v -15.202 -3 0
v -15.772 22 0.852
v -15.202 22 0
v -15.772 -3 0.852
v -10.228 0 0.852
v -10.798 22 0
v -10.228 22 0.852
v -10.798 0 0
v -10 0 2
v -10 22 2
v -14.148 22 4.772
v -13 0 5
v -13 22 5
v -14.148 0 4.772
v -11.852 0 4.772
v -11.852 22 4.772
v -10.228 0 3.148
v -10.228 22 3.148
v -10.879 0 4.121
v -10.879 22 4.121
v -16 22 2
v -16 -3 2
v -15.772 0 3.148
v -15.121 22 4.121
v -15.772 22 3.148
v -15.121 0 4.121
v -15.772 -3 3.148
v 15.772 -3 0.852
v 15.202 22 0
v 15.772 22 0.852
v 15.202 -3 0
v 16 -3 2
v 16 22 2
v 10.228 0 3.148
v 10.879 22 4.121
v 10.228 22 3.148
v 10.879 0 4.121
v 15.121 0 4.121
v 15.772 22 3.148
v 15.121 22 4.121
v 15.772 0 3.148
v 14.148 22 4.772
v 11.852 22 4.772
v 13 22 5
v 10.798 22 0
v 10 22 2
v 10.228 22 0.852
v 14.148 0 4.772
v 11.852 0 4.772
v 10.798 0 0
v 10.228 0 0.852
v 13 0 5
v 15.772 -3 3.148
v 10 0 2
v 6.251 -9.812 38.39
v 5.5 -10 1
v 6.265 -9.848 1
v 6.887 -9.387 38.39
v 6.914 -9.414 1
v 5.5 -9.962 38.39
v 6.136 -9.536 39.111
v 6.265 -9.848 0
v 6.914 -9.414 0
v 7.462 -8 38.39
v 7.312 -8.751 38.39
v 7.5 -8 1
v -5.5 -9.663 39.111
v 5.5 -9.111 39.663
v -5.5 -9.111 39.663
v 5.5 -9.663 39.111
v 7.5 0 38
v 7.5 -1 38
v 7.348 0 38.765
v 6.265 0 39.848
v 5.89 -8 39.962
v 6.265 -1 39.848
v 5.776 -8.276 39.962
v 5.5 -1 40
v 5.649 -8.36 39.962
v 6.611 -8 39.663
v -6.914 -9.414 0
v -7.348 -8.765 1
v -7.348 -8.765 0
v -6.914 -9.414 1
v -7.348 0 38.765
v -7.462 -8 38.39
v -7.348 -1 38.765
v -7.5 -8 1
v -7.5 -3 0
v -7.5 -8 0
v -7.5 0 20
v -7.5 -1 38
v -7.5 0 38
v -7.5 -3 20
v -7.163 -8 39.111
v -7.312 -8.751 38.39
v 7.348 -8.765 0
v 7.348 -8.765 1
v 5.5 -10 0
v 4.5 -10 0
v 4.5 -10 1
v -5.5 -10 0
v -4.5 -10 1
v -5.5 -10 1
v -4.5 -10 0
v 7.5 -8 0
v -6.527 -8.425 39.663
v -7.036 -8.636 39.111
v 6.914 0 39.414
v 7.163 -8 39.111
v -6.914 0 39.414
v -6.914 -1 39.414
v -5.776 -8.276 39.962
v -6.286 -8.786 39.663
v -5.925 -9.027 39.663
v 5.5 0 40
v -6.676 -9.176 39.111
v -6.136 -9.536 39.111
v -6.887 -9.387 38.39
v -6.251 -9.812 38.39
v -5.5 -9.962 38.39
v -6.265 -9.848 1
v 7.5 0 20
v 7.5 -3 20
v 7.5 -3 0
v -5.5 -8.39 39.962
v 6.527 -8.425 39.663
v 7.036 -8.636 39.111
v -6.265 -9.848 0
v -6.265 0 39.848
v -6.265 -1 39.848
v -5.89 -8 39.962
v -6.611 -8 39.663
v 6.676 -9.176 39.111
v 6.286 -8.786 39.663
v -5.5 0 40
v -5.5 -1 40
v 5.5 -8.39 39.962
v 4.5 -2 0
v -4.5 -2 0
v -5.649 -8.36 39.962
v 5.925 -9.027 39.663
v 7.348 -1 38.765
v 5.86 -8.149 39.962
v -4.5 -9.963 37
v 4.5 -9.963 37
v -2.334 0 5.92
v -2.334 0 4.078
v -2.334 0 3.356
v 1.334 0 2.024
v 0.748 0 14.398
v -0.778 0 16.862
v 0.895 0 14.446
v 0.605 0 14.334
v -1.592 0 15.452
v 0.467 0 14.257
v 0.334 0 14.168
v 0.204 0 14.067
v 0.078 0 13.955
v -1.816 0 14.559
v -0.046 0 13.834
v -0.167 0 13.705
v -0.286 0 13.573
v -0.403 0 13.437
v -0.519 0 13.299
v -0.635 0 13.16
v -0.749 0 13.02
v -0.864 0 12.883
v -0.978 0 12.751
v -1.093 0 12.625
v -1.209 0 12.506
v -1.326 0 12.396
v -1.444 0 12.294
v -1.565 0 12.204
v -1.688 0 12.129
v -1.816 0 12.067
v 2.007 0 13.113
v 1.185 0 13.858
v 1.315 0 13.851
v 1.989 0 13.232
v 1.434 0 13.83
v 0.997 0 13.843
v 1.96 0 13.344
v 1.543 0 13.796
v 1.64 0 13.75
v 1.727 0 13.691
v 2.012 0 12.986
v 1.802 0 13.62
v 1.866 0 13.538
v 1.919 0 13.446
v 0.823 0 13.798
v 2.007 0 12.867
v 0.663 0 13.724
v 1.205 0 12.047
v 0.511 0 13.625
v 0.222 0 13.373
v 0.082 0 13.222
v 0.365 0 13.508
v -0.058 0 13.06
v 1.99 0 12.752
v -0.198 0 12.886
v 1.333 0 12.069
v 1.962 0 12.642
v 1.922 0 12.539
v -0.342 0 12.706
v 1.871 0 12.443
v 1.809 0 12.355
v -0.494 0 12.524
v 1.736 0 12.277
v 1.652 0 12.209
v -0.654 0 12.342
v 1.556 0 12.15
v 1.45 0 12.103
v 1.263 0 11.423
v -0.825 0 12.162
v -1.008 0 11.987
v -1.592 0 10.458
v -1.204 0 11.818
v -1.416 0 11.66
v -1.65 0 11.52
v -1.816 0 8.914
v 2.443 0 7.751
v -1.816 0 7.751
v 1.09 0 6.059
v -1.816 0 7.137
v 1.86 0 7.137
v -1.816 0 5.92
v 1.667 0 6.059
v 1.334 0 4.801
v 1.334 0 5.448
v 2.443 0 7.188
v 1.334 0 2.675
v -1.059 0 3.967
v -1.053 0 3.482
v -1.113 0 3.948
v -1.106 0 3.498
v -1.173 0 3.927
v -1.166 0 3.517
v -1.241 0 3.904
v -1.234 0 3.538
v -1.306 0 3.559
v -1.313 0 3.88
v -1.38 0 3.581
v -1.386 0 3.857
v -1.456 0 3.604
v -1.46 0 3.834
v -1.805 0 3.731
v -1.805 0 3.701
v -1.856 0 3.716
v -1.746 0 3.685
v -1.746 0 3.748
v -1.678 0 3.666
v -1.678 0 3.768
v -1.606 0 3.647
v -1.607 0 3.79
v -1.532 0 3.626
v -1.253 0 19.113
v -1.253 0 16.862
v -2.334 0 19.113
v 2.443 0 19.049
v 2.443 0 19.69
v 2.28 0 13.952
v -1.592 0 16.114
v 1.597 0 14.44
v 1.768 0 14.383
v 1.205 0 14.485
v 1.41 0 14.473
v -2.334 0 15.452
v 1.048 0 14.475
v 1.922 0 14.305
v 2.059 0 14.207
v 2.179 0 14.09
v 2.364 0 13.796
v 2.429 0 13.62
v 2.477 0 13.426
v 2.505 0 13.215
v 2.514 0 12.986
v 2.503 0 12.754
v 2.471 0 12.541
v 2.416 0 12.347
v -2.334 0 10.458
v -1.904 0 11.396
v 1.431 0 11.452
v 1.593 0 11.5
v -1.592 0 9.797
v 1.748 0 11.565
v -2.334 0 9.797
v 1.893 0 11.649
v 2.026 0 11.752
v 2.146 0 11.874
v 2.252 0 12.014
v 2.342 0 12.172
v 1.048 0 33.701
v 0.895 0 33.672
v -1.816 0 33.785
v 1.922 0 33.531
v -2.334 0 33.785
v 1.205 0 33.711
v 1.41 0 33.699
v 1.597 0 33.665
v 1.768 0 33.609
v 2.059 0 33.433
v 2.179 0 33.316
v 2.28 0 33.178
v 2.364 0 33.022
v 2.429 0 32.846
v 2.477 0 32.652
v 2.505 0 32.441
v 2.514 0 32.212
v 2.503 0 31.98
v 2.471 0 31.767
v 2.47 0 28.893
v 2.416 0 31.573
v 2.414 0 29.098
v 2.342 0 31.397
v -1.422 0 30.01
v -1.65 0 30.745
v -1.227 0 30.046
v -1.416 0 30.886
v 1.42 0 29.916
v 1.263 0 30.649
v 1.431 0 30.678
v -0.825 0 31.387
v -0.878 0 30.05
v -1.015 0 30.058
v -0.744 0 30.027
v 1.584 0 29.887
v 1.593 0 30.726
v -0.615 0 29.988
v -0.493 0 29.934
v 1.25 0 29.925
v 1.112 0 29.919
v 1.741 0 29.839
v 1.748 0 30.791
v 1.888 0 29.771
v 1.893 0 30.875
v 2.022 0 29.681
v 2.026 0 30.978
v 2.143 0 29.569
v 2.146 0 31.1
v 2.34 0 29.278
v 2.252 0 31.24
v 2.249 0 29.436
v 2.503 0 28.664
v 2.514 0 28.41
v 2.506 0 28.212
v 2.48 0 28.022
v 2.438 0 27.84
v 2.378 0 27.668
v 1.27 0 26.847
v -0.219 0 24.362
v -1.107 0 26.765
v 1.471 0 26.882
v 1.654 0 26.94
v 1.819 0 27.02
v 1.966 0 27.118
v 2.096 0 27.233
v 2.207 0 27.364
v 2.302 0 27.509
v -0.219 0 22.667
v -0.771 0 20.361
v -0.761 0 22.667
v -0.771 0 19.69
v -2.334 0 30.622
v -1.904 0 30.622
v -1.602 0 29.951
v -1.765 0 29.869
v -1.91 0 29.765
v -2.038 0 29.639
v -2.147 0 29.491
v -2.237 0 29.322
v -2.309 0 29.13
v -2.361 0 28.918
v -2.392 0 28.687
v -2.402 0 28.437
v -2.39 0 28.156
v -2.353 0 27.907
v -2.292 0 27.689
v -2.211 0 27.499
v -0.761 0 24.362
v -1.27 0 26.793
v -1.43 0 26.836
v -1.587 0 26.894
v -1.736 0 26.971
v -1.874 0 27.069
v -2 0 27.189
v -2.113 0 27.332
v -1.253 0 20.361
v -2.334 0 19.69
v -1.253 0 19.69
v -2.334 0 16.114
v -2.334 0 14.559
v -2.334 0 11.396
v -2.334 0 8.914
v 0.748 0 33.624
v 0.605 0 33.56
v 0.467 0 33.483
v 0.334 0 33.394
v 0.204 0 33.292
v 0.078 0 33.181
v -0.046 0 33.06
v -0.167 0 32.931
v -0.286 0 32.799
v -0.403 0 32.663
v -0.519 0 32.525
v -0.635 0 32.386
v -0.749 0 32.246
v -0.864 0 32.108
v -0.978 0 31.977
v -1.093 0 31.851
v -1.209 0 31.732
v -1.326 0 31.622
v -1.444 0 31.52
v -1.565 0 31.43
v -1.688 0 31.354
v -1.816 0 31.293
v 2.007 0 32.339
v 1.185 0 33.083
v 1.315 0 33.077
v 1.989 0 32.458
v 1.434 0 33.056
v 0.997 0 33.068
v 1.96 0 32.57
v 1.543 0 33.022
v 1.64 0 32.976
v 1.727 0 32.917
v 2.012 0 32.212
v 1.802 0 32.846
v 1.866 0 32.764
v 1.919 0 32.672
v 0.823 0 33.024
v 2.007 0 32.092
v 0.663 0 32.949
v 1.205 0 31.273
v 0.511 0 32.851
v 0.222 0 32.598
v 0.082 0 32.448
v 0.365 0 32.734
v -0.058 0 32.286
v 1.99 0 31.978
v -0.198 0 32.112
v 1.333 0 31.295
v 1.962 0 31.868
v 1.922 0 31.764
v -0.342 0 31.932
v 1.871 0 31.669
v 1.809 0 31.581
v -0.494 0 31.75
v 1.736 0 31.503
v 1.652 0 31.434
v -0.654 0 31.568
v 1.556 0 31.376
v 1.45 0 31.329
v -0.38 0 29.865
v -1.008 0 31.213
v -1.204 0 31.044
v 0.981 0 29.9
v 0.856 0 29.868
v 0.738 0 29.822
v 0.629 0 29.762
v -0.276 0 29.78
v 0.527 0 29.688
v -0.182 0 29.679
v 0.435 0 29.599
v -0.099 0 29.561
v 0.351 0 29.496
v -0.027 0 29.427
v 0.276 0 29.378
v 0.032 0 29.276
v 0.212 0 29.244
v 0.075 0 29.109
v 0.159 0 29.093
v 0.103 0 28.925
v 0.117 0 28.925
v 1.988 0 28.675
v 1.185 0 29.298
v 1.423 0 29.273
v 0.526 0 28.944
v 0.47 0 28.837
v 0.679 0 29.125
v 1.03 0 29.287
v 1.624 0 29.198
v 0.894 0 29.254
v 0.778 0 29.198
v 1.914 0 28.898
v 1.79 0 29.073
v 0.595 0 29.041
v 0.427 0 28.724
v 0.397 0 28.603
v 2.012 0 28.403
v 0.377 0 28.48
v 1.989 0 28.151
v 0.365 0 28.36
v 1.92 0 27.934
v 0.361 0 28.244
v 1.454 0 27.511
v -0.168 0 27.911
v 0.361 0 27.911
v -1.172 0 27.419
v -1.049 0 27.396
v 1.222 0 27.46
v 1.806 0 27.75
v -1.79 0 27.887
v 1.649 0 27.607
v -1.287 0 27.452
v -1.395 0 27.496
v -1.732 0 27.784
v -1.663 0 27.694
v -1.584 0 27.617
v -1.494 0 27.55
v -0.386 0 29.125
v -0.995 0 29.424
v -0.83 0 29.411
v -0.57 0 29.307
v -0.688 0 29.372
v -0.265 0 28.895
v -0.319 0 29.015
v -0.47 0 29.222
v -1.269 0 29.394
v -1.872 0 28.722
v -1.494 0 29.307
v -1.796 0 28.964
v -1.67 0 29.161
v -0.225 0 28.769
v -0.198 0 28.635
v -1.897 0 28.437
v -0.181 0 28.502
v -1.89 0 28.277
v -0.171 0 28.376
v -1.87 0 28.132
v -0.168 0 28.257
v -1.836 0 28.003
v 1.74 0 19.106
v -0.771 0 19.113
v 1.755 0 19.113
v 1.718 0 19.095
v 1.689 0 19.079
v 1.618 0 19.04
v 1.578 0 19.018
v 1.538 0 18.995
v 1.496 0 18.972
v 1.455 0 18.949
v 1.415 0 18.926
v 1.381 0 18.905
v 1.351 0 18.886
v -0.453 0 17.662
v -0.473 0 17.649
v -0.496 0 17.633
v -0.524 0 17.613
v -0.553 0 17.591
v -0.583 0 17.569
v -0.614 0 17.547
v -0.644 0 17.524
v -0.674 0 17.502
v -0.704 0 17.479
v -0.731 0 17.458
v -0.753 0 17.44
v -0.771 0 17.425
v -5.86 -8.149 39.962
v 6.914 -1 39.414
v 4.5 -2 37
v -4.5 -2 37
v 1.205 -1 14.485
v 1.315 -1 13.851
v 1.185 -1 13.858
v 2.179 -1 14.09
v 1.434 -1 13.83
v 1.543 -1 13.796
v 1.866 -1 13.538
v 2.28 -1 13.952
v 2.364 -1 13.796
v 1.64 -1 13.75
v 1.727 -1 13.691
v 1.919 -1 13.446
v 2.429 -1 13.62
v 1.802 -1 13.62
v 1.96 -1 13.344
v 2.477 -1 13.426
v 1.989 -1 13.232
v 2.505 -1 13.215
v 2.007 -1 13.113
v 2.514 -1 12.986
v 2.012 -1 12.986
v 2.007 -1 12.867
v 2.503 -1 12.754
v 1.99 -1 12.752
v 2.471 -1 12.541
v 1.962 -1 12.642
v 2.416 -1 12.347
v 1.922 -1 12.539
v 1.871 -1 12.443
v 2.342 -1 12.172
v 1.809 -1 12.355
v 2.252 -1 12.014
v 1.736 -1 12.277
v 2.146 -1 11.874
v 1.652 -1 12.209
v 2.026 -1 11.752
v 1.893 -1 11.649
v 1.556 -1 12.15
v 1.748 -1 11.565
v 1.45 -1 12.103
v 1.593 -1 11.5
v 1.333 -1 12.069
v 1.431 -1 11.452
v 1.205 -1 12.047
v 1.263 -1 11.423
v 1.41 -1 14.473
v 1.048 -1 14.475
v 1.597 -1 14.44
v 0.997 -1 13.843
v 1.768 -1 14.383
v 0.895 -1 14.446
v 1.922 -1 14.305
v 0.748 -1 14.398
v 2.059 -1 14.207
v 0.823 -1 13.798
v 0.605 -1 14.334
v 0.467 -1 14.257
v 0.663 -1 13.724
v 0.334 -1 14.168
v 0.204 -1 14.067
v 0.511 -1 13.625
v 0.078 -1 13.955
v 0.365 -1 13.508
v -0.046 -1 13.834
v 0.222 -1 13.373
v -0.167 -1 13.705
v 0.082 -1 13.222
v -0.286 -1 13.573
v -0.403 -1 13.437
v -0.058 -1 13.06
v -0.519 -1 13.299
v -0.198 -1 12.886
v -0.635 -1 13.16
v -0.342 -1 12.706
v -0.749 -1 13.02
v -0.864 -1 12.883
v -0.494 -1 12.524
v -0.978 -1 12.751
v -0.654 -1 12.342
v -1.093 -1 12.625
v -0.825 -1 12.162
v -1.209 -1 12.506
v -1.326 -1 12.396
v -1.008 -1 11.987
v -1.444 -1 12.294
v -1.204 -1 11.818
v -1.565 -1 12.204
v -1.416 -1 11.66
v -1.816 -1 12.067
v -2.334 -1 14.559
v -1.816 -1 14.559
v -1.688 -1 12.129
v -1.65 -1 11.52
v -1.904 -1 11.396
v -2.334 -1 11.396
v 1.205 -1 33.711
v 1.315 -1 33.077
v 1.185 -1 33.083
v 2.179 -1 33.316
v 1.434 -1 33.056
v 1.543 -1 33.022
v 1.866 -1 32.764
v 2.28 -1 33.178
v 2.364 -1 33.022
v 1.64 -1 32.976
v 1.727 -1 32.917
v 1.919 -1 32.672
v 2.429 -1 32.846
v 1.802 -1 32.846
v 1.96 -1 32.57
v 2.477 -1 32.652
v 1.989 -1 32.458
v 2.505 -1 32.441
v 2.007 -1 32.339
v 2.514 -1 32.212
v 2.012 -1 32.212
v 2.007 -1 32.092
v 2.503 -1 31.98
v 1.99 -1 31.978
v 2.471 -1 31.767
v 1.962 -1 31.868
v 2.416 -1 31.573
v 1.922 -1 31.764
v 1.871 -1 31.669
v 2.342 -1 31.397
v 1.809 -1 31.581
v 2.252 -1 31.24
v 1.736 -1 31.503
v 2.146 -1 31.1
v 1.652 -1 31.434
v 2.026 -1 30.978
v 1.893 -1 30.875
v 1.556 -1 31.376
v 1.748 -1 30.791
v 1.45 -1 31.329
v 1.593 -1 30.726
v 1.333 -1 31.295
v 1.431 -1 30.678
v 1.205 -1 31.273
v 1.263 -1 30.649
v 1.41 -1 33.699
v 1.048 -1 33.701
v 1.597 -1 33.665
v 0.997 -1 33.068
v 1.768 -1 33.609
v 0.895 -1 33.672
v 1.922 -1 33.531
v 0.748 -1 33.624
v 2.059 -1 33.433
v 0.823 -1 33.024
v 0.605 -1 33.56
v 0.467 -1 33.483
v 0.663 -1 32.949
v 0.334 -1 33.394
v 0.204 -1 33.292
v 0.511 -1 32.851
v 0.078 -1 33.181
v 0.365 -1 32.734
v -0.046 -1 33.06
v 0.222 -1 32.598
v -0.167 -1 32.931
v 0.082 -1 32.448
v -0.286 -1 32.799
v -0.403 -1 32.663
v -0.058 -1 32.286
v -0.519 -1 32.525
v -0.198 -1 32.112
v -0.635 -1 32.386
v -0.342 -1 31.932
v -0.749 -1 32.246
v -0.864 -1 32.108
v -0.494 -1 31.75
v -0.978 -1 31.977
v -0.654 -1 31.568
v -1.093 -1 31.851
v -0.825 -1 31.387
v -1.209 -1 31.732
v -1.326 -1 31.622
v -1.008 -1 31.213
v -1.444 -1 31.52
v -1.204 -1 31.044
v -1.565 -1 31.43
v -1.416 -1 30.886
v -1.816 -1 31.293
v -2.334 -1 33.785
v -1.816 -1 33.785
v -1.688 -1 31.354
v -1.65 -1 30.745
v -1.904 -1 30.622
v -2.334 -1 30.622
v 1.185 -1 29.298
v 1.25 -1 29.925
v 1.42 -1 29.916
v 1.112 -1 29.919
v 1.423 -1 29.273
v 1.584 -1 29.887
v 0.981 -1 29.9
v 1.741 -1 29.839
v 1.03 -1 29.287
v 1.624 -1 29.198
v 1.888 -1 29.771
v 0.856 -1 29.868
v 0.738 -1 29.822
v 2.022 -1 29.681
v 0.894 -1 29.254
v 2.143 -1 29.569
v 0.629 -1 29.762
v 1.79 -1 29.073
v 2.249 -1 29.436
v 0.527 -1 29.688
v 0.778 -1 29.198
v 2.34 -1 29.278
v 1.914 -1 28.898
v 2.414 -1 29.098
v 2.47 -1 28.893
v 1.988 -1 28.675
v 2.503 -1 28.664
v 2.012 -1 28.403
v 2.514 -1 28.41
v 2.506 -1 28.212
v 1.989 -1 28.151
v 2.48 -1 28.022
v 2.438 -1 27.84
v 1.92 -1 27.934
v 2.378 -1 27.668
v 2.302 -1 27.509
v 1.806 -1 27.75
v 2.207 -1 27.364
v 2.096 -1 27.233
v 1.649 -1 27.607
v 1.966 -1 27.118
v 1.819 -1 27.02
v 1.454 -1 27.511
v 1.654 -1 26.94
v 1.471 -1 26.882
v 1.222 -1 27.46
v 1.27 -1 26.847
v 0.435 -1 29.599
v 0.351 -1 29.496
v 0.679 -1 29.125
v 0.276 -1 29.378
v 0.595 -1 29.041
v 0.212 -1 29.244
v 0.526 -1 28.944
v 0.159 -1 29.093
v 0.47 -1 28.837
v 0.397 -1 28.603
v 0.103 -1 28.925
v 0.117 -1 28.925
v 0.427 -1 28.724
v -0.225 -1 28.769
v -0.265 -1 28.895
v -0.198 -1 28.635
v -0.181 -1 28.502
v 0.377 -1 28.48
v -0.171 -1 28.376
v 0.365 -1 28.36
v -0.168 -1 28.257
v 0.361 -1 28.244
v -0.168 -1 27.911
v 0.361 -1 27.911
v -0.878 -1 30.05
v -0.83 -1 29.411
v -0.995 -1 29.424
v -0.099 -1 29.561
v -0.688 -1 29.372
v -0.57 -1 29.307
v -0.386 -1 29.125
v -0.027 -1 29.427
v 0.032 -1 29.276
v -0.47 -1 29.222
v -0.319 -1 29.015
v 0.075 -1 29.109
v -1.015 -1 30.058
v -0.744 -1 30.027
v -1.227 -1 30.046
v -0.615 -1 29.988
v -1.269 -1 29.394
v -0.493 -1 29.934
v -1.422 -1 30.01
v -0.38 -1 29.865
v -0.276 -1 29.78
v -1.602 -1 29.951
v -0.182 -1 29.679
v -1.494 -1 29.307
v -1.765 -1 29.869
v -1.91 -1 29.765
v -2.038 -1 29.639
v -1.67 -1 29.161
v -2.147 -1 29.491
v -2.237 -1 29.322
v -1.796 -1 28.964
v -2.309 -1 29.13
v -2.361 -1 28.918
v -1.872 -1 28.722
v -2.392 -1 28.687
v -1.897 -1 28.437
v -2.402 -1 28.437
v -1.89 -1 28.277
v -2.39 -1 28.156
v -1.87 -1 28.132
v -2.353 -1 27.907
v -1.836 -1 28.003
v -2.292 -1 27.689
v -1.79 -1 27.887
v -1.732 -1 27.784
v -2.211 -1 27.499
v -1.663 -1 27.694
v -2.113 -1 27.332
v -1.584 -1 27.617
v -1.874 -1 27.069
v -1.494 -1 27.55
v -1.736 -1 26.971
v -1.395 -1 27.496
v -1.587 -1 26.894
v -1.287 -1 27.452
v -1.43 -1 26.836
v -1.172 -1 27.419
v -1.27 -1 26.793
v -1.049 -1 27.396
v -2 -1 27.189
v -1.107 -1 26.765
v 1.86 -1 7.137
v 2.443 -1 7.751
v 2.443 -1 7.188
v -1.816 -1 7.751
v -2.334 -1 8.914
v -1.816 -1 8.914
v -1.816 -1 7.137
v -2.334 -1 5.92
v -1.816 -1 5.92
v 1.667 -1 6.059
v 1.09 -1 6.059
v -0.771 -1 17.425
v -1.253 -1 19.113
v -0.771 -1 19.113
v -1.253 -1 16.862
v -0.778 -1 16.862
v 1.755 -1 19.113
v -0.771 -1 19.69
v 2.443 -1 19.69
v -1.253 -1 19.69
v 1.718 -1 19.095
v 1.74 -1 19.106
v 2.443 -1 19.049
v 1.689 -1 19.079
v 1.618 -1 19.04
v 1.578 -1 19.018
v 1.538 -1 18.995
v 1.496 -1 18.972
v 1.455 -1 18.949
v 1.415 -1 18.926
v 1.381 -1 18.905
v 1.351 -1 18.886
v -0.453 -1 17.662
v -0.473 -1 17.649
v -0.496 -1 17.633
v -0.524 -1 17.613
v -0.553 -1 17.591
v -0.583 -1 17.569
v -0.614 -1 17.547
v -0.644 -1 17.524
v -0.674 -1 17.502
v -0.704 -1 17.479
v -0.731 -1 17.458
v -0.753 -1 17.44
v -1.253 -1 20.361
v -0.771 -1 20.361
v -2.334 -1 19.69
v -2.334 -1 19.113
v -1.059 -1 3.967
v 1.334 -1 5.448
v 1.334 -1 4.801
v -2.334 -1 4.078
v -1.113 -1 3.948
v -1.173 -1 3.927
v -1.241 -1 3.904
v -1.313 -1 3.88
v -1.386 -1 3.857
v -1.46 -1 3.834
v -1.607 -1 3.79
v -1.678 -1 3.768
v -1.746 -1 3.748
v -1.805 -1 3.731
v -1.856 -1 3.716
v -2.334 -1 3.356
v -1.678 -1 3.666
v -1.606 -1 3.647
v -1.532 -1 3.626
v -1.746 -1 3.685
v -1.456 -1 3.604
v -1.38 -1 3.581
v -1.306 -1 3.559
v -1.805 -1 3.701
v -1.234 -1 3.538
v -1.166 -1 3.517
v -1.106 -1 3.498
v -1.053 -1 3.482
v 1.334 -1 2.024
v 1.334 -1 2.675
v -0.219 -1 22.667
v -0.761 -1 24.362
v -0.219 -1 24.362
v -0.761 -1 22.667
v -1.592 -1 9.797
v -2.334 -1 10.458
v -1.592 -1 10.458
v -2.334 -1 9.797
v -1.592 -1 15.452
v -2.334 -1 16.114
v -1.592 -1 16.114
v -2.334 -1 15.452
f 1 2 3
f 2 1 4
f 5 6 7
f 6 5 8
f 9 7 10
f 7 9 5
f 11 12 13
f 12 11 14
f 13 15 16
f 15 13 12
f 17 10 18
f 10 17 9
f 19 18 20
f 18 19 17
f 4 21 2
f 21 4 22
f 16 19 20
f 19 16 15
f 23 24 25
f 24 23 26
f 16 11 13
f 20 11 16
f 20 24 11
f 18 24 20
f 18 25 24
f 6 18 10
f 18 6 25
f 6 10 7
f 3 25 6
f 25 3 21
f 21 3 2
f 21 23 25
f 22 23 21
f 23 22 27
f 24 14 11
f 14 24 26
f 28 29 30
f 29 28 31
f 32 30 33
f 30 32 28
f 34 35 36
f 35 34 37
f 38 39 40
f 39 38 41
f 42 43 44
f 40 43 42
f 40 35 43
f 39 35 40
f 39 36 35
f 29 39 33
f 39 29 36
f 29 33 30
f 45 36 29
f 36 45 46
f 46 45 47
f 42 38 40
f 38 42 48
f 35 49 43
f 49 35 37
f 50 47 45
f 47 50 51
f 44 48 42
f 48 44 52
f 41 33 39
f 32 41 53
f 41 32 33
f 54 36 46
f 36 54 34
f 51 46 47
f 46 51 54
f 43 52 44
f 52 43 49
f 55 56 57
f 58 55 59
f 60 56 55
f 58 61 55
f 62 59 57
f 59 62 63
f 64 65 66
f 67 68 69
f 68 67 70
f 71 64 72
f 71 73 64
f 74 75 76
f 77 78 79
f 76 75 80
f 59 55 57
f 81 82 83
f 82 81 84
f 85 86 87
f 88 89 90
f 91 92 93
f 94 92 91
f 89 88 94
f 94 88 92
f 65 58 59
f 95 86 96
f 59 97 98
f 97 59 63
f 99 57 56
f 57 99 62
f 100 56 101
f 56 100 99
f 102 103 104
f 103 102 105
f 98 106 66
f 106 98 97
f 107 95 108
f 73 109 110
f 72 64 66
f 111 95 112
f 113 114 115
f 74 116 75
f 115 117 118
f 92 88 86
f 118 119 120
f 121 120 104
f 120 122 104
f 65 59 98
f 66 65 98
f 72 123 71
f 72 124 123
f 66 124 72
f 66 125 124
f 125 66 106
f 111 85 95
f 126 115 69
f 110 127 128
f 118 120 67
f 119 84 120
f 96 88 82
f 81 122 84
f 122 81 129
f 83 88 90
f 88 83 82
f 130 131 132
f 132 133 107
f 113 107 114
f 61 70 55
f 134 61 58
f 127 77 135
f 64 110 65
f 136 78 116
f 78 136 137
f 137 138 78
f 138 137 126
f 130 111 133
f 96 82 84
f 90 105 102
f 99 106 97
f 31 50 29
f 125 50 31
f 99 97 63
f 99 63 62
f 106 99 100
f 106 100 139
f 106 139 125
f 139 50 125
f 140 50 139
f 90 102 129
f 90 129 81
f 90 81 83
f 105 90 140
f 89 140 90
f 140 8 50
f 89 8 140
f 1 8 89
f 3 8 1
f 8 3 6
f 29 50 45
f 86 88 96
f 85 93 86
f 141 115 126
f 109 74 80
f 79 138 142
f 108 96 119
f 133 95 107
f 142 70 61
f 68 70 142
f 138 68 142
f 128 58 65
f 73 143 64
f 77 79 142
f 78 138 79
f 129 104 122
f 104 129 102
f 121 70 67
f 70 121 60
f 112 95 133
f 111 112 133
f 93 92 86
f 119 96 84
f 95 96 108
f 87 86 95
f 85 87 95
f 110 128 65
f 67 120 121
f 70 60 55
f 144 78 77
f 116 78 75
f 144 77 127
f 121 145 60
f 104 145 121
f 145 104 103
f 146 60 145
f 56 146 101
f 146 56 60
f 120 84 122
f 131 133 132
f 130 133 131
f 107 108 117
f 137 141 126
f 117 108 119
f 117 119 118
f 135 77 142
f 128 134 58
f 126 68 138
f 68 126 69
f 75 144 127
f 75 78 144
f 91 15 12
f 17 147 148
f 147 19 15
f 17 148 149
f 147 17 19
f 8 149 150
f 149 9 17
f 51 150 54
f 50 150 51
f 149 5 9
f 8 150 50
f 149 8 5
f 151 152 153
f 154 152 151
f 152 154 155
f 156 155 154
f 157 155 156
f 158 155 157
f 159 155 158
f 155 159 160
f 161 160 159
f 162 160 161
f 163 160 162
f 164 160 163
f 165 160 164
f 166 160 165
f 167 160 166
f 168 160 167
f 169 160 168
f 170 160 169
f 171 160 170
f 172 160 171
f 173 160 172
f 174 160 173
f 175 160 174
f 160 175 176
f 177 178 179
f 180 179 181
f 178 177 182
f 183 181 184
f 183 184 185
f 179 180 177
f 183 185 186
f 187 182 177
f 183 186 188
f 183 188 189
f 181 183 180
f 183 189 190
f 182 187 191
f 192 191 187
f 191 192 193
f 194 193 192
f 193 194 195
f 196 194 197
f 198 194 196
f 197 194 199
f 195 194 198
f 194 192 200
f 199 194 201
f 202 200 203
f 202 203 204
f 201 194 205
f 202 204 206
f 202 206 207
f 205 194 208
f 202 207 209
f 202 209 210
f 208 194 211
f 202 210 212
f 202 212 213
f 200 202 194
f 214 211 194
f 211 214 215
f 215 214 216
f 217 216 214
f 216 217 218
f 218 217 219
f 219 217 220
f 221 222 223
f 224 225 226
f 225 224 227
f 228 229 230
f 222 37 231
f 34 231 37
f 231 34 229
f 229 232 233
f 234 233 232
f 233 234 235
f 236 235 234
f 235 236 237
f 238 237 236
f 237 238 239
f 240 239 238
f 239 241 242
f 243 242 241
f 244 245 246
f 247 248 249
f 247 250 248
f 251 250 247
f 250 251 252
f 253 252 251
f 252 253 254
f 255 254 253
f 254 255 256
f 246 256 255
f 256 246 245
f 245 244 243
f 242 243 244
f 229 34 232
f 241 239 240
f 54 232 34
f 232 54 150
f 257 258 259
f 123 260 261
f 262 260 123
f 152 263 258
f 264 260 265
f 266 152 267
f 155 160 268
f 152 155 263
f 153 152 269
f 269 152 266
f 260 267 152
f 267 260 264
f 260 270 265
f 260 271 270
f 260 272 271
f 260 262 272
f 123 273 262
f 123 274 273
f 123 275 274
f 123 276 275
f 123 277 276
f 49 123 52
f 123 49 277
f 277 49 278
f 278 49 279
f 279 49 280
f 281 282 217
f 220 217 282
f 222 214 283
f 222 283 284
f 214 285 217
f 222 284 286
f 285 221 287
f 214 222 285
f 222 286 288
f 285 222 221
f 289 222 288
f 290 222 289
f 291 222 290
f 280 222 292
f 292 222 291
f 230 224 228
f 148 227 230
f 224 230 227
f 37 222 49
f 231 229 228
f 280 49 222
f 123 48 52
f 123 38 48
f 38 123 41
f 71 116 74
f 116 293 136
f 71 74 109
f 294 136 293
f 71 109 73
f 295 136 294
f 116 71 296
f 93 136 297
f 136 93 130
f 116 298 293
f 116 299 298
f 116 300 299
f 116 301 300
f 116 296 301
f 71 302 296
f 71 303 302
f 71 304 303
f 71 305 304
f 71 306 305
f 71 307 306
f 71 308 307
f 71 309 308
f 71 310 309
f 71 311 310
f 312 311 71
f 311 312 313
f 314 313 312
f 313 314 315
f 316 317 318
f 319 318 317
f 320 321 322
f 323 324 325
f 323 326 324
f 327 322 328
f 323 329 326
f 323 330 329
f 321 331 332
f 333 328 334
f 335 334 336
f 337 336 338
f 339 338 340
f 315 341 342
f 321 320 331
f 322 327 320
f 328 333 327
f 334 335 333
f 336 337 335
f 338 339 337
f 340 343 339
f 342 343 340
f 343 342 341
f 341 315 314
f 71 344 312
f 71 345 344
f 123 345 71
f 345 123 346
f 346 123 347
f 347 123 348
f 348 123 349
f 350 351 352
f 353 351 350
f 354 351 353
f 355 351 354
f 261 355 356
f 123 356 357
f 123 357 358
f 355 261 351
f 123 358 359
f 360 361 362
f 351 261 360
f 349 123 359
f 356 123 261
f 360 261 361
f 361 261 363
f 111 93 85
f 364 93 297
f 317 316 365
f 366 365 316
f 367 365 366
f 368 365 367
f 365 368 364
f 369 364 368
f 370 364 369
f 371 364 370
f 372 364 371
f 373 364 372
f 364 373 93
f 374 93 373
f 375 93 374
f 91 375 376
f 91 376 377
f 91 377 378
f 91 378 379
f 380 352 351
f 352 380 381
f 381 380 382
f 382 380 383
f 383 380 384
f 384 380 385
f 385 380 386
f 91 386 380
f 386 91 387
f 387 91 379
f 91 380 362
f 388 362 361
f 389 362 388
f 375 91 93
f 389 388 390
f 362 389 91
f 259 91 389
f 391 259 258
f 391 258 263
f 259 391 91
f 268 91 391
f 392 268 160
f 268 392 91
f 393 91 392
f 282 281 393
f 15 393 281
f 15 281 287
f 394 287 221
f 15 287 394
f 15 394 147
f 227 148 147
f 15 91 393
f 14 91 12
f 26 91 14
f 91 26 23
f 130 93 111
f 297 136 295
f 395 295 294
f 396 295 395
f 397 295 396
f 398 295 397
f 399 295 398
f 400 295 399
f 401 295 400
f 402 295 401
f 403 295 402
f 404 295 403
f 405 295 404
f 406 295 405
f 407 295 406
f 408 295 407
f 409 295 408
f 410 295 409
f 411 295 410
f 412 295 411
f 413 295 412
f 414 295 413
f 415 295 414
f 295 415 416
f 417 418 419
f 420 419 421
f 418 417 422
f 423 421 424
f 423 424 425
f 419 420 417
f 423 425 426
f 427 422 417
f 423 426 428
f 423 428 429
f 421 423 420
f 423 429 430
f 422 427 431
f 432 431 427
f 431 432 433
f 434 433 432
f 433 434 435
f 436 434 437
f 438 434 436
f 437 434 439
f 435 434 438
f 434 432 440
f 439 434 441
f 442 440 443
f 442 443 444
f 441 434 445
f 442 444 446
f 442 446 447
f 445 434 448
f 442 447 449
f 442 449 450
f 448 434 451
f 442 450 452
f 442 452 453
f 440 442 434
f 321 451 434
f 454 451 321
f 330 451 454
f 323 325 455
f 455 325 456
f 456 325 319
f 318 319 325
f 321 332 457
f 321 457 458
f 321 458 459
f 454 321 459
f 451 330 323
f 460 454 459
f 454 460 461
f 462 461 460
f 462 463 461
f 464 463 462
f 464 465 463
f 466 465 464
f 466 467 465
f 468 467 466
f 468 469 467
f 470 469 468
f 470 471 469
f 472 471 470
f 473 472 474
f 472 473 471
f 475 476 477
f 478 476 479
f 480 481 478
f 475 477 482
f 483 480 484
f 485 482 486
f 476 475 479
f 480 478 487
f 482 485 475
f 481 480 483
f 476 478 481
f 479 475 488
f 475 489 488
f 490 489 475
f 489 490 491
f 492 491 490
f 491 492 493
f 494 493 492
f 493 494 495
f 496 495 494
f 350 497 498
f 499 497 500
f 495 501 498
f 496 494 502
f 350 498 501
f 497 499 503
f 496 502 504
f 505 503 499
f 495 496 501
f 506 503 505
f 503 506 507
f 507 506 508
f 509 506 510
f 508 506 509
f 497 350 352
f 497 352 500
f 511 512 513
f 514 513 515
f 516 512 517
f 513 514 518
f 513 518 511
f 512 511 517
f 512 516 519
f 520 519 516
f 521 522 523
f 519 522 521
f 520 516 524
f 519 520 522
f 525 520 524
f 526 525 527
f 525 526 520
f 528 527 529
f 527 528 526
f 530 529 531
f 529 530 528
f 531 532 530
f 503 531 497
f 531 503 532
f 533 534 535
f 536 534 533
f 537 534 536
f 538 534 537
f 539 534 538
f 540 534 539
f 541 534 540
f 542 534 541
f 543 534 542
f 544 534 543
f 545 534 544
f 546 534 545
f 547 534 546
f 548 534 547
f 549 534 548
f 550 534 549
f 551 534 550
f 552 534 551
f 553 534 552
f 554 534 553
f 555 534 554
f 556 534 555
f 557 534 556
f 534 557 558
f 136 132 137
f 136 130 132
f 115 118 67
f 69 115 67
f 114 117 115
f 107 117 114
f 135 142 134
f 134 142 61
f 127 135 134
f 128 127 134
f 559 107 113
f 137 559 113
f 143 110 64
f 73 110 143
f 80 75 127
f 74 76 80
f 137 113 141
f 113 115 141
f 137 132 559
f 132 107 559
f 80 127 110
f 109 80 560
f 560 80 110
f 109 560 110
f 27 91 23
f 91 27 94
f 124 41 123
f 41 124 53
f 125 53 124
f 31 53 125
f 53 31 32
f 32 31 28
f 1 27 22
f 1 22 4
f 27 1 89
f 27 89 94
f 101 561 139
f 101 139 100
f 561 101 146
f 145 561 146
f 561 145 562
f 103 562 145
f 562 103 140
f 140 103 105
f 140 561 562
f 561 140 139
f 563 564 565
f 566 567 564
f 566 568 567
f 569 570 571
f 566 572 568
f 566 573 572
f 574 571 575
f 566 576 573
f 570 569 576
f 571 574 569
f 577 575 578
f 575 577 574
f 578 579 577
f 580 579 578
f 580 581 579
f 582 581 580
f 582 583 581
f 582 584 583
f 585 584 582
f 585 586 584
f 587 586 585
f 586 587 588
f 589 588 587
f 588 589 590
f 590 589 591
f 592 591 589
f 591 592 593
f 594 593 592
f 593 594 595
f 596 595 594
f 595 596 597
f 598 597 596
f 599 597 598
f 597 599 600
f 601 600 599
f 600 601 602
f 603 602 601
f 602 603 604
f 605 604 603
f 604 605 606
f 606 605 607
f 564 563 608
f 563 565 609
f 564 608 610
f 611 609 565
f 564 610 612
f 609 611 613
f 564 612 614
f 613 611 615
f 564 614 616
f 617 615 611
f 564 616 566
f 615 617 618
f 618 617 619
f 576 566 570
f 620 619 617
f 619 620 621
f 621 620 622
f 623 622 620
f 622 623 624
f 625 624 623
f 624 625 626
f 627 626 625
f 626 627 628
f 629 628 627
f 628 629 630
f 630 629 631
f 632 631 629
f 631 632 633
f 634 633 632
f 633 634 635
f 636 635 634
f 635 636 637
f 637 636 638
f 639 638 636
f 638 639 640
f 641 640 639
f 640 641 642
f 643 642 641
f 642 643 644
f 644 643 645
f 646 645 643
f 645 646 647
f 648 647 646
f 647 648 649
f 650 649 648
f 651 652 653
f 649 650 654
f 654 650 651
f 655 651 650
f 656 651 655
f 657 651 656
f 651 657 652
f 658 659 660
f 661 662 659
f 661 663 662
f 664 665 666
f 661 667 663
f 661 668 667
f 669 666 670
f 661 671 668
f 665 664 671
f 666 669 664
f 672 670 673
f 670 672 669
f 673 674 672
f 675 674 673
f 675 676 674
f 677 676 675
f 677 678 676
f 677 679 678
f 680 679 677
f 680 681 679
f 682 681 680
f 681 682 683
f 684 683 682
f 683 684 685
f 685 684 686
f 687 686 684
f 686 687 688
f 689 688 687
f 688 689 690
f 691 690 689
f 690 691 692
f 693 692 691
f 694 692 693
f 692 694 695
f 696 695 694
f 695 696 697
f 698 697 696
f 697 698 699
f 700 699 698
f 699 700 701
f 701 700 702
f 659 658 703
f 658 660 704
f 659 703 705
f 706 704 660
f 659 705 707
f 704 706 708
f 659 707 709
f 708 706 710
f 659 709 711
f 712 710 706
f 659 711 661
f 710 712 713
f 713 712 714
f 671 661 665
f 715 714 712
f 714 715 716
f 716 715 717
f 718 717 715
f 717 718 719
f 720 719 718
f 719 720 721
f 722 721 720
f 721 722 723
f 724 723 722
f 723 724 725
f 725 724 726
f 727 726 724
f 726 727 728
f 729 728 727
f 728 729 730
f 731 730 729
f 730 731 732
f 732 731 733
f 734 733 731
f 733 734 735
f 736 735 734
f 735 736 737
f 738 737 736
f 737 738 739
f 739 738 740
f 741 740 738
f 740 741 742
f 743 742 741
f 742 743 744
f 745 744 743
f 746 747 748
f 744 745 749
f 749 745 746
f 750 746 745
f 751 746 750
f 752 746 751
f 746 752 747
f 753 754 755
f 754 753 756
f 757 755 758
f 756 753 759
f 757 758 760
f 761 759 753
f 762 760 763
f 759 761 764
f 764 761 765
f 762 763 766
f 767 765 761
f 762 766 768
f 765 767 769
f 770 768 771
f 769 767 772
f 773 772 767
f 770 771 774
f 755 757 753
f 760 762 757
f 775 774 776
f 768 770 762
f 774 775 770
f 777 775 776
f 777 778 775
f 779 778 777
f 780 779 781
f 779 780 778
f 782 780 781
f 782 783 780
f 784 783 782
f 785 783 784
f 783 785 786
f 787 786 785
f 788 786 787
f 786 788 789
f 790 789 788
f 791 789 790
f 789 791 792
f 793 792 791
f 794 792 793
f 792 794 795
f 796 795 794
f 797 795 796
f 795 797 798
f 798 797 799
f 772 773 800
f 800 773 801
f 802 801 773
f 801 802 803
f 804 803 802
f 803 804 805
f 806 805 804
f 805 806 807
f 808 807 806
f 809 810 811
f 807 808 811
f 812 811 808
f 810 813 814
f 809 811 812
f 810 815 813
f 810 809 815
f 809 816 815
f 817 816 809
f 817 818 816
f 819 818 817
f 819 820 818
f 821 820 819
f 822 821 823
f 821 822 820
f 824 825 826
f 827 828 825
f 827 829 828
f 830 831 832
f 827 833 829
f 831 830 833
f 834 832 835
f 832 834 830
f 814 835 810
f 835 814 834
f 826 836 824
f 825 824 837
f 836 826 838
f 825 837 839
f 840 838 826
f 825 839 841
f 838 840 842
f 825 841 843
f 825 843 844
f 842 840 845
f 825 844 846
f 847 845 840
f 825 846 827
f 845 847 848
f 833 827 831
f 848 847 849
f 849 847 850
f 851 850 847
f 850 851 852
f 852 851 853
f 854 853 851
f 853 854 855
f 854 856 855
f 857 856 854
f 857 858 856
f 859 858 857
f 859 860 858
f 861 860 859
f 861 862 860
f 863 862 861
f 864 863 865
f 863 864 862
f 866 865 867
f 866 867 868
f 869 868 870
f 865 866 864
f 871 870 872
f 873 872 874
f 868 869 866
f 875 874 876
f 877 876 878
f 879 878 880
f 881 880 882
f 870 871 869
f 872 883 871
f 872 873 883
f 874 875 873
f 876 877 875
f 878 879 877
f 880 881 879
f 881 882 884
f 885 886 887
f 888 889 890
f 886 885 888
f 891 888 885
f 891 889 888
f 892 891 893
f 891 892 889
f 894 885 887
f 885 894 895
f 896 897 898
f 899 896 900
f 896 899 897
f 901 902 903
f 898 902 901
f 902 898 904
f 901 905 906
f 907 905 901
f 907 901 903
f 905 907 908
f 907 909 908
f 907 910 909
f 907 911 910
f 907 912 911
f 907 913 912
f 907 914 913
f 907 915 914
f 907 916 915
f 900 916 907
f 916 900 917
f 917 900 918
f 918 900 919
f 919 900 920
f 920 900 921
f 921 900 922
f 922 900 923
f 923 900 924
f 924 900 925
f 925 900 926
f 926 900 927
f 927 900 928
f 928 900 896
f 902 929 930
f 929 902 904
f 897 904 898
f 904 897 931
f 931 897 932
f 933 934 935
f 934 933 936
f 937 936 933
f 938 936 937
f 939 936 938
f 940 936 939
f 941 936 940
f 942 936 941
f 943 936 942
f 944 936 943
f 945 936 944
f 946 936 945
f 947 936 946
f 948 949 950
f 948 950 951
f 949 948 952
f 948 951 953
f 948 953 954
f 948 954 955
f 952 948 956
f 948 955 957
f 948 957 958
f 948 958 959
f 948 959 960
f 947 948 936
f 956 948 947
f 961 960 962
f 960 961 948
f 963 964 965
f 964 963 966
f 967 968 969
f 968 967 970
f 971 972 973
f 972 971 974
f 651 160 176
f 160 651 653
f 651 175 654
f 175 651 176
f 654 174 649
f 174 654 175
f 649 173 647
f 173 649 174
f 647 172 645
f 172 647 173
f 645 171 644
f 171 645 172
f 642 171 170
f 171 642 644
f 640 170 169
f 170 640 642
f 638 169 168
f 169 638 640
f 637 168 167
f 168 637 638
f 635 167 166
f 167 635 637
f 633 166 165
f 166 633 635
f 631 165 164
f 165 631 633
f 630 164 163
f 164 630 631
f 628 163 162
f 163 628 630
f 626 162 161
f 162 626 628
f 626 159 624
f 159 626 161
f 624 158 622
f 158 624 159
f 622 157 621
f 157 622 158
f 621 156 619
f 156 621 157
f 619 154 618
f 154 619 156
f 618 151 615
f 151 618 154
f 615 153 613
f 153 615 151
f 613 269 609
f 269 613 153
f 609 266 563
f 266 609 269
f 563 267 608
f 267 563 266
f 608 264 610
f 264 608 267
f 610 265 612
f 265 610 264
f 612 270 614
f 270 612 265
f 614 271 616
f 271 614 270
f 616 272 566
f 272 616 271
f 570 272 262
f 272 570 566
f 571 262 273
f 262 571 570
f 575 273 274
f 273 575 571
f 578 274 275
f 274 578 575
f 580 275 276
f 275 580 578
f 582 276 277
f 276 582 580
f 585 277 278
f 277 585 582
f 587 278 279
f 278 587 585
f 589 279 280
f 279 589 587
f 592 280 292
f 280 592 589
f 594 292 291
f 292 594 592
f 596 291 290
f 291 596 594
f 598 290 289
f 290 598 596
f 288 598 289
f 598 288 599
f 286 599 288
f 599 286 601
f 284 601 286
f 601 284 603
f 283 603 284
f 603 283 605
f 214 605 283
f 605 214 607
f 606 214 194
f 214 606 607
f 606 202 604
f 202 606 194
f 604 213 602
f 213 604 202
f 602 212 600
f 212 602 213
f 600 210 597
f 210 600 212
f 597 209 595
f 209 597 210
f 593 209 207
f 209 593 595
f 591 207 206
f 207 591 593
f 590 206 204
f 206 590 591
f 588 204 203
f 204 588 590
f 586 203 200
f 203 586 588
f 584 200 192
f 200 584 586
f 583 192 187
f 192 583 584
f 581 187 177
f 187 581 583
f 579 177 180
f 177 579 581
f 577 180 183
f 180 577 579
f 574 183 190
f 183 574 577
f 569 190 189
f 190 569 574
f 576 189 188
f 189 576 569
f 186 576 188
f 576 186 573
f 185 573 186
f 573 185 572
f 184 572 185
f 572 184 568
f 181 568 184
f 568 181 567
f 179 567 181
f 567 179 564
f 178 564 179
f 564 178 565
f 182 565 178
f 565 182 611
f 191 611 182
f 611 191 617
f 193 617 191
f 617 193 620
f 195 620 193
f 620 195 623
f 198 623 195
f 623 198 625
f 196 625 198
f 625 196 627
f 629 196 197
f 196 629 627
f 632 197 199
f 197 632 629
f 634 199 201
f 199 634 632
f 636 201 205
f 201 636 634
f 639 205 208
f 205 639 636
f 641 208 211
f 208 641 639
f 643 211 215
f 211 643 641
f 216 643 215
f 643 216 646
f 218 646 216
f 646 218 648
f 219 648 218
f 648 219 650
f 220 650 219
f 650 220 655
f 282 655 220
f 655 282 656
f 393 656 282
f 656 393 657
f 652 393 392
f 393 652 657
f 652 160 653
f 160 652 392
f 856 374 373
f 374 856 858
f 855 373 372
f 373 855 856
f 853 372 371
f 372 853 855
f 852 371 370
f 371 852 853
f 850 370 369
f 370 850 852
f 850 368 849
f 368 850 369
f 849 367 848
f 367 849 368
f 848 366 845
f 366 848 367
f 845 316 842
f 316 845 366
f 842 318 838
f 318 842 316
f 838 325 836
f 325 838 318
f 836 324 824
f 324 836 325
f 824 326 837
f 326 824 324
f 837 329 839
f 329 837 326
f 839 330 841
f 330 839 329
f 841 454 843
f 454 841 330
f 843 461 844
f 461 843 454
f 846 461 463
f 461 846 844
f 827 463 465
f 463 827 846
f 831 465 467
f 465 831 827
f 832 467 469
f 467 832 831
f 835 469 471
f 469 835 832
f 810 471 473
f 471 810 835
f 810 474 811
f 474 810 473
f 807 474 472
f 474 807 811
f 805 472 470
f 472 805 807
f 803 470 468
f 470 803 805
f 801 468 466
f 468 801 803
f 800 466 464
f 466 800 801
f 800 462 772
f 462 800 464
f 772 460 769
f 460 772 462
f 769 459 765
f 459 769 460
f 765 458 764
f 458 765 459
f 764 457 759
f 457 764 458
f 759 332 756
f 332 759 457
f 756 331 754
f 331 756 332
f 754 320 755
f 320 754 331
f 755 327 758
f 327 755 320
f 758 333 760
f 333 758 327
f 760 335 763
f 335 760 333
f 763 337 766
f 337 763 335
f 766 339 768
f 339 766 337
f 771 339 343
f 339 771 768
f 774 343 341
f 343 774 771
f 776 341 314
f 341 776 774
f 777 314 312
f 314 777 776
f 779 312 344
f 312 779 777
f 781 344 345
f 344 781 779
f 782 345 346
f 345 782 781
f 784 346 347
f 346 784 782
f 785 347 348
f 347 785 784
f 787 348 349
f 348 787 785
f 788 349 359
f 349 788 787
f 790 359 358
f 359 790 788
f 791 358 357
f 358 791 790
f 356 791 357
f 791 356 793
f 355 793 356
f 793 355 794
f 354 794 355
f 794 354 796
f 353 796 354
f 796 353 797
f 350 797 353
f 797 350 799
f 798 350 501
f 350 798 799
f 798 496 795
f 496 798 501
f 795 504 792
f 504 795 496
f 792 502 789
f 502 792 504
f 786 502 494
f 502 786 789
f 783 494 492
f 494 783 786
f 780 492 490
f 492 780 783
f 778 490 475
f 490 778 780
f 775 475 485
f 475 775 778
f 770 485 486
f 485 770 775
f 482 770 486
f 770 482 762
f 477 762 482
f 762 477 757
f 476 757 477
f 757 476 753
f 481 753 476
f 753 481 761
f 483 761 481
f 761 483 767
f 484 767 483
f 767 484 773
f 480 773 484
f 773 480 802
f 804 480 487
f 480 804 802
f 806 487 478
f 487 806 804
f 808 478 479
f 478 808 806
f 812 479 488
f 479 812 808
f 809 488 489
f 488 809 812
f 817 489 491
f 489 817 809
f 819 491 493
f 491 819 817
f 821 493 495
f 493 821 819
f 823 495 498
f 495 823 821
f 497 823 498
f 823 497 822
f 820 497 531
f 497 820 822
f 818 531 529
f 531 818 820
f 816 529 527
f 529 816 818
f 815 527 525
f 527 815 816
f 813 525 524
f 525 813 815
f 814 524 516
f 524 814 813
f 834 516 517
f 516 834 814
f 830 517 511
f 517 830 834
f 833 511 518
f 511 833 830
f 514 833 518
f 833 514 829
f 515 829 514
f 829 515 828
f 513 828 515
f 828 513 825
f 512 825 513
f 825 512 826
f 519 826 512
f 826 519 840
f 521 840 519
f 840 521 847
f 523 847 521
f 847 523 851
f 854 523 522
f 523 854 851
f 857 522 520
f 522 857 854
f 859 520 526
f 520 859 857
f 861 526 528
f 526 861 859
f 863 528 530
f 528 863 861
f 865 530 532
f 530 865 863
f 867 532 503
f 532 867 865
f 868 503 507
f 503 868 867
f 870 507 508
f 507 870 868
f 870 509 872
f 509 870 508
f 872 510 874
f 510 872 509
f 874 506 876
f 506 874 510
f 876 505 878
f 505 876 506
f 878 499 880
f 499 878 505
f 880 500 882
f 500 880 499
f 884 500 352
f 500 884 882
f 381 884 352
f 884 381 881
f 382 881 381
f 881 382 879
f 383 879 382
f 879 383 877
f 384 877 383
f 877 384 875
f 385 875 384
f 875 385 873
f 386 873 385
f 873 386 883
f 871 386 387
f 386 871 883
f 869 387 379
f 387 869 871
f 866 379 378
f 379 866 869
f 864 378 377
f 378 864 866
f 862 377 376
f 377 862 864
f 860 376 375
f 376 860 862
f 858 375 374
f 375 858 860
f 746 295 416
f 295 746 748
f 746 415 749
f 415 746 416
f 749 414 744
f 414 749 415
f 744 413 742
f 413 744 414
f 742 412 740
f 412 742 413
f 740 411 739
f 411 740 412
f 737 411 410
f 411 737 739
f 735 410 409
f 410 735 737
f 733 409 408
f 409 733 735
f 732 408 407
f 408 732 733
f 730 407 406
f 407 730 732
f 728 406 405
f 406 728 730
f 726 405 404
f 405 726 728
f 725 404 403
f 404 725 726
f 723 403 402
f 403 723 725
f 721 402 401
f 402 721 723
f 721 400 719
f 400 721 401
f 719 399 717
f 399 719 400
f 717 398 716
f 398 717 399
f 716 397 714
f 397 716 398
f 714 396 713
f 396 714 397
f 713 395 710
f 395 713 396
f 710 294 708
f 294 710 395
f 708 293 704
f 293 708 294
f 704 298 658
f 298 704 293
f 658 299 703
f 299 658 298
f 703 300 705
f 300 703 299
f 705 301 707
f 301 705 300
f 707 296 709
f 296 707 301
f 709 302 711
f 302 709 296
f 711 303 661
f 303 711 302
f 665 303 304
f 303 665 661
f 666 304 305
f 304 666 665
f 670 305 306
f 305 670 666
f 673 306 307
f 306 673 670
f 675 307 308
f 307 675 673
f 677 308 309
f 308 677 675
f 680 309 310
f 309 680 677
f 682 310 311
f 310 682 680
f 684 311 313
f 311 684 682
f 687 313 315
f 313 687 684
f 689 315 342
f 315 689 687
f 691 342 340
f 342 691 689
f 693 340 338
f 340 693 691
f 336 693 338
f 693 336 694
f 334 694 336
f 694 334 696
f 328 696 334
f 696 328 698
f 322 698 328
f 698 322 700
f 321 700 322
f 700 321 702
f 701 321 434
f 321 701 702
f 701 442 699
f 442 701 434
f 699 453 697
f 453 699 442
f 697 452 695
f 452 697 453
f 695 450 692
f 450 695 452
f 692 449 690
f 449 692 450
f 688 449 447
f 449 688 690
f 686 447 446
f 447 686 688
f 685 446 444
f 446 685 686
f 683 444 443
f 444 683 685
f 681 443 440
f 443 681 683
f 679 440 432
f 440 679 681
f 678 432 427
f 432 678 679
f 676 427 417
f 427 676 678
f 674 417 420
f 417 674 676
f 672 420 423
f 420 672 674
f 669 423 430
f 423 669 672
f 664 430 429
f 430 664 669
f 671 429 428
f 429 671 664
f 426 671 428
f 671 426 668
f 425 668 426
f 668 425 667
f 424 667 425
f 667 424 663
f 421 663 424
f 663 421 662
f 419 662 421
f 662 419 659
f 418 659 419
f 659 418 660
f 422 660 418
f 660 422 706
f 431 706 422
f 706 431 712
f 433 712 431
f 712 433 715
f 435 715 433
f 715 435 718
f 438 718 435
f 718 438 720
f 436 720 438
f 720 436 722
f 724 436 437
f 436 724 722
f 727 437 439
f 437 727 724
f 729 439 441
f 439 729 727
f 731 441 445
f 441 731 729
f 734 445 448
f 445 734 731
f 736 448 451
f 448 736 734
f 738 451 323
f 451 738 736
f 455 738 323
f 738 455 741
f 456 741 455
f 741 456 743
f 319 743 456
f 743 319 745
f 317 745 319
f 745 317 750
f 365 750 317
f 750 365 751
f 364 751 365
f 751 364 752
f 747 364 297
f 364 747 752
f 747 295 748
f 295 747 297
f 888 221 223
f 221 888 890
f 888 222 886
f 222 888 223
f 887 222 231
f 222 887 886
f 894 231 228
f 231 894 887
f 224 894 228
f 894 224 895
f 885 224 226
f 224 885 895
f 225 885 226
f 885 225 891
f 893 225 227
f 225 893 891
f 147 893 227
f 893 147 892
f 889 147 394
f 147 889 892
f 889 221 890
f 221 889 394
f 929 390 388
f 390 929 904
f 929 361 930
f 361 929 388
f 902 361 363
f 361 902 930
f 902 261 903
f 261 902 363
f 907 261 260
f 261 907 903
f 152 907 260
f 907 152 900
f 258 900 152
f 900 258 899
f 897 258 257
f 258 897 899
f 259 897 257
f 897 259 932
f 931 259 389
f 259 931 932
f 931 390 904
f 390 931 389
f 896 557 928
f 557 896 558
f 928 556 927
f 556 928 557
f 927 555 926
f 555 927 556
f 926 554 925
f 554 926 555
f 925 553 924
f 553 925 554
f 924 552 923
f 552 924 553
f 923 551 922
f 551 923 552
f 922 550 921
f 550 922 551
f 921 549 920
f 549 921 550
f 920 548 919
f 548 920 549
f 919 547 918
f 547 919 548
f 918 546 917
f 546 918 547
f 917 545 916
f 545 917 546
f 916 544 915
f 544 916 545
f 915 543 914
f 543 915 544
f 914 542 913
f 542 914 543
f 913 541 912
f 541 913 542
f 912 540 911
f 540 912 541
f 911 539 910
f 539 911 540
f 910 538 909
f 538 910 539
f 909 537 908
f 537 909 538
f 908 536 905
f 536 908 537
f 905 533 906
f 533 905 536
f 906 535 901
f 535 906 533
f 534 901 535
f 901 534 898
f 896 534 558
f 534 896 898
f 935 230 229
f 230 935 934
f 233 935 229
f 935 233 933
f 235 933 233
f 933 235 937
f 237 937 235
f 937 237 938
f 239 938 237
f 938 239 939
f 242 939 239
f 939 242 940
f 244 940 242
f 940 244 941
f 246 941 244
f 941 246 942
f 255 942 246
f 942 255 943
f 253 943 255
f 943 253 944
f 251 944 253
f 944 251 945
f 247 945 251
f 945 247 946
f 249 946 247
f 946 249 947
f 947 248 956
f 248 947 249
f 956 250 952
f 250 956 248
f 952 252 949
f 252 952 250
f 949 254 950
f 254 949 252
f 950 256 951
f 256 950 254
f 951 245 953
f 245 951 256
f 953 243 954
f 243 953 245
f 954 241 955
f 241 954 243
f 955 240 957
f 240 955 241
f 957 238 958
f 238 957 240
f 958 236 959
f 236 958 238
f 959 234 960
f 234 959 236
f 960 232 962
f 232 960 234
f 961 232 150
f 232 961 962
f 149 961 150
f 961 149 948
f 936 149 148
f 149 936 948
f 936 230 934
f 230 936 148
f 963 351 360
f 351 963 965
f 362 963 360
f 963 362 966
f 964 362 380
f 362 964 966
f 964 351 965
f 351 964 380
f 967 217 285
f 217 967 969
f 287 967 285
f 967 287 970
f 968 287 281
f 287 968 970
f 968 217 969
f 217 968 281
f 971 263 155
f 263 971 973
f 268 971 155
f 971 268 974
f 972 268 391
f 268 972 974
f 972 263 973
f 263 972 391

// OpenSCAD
// Ikea Ivar brackets
// to add additional horizontals into uprights e.g. as bookends

// settable parameters

// slot width (9 results in cup side-walls 3mm thick)
width=9;

// depth of slot below bottom edge of holes in uprights
// slot depth (32 puts bottom of bracket flush with bottom of shelf)
depth=32;
// note that bracket itself will extend from 5mm above bottom edge of holes
// to 3mm below the bottom of the slot, i.e. the bracket total height is 8mm
// greater than the dimension specified here

// bracket projection at top - just set for desired aesthetics
proj_t=10;

// bracket projection at bottom
proj_b=10;

// proj_t & proj_b uploaded to thingiverse: 10/20 & 10/10

// label will be embossed into concealed face of back-plane
label="v1.2.4 - 32";

// heght of label text
lbl_size=5;

// non-settable parameters:
// peg size is hard-coded 6mm diameter 22mm long (holes are 26mm deep)
// back-plane thickness is hard-coded at 3mm outside and 2mm inside teh slot
// so wood piece 430mm long for 50cm shelves and 230mm long for 30cm shelves 
// cup corners all filleted 2mm radius
// cup base 3mm thick
// text is embossed 1mm deep



// set default circle refinement
$fn=16;



difference(){
    union(){
    // mounting pegs are 6mm diameter and 22mm long
	// to avoid steep overhangs 1mm is trimmed off
	translate([-13,-2,2]) rotate([-90,0,0]) cylinder(24,3,3);
	translate([13,-2,2]) rotate([-90,0,0]) cylinder(24,3,3);
	// wood piece cup
        hull(){
	    // top back
            translate([-7.5,-1,0]) cube([15,1,1]);
	    // bottom back
            translate([-5.5,0,depth+6]) rotate([90,0,0]) cylinder(1,2,2);
            translate([5.5,0,depth+6]) rotate([90,0,0]) cylinder(1,2,2);
	    // bottom outer
	    translate([-5.5,2-proj_b,depth+6]) sphere(2);
	    translate([5.5,2-proj_b,depth+6]) sphere(2);
	    // top outer
	    translate([-5.5,2-proj_t,0]) cylinder(1,2,2);
	    translate([5.5,2-proj_t,0]) cylinder(1,2,2);
	    }
	// back plane
        hull(){
	    // top back
            translate([-13,0,2]) rotate([90,0,0]) cylinder(3,3,3);
            translate([13,0,2]) rotate([90,0,0]) cylinder(3,3,3);
	    // bottom back is up to 16 below peg
	    dd = depth>14 ? 19 : depth+5;
            translate([-7.5,-3,dd]) cube([15,3,1]);
	}
    }

    // trim projection below z=0 plane
    translate([-100,-100,-20]) cube([200,200,20]);

    // cutout for wood piece
    translate([-width/2,-52,-1]) cube([width,50,depth+6]);

    // emboss label text
    translate([0,-1,2]) rotate([-90,-90,0]) linear_extrude(2)
        text(label, size=lbl_size, halign="left", valign="center");

}
